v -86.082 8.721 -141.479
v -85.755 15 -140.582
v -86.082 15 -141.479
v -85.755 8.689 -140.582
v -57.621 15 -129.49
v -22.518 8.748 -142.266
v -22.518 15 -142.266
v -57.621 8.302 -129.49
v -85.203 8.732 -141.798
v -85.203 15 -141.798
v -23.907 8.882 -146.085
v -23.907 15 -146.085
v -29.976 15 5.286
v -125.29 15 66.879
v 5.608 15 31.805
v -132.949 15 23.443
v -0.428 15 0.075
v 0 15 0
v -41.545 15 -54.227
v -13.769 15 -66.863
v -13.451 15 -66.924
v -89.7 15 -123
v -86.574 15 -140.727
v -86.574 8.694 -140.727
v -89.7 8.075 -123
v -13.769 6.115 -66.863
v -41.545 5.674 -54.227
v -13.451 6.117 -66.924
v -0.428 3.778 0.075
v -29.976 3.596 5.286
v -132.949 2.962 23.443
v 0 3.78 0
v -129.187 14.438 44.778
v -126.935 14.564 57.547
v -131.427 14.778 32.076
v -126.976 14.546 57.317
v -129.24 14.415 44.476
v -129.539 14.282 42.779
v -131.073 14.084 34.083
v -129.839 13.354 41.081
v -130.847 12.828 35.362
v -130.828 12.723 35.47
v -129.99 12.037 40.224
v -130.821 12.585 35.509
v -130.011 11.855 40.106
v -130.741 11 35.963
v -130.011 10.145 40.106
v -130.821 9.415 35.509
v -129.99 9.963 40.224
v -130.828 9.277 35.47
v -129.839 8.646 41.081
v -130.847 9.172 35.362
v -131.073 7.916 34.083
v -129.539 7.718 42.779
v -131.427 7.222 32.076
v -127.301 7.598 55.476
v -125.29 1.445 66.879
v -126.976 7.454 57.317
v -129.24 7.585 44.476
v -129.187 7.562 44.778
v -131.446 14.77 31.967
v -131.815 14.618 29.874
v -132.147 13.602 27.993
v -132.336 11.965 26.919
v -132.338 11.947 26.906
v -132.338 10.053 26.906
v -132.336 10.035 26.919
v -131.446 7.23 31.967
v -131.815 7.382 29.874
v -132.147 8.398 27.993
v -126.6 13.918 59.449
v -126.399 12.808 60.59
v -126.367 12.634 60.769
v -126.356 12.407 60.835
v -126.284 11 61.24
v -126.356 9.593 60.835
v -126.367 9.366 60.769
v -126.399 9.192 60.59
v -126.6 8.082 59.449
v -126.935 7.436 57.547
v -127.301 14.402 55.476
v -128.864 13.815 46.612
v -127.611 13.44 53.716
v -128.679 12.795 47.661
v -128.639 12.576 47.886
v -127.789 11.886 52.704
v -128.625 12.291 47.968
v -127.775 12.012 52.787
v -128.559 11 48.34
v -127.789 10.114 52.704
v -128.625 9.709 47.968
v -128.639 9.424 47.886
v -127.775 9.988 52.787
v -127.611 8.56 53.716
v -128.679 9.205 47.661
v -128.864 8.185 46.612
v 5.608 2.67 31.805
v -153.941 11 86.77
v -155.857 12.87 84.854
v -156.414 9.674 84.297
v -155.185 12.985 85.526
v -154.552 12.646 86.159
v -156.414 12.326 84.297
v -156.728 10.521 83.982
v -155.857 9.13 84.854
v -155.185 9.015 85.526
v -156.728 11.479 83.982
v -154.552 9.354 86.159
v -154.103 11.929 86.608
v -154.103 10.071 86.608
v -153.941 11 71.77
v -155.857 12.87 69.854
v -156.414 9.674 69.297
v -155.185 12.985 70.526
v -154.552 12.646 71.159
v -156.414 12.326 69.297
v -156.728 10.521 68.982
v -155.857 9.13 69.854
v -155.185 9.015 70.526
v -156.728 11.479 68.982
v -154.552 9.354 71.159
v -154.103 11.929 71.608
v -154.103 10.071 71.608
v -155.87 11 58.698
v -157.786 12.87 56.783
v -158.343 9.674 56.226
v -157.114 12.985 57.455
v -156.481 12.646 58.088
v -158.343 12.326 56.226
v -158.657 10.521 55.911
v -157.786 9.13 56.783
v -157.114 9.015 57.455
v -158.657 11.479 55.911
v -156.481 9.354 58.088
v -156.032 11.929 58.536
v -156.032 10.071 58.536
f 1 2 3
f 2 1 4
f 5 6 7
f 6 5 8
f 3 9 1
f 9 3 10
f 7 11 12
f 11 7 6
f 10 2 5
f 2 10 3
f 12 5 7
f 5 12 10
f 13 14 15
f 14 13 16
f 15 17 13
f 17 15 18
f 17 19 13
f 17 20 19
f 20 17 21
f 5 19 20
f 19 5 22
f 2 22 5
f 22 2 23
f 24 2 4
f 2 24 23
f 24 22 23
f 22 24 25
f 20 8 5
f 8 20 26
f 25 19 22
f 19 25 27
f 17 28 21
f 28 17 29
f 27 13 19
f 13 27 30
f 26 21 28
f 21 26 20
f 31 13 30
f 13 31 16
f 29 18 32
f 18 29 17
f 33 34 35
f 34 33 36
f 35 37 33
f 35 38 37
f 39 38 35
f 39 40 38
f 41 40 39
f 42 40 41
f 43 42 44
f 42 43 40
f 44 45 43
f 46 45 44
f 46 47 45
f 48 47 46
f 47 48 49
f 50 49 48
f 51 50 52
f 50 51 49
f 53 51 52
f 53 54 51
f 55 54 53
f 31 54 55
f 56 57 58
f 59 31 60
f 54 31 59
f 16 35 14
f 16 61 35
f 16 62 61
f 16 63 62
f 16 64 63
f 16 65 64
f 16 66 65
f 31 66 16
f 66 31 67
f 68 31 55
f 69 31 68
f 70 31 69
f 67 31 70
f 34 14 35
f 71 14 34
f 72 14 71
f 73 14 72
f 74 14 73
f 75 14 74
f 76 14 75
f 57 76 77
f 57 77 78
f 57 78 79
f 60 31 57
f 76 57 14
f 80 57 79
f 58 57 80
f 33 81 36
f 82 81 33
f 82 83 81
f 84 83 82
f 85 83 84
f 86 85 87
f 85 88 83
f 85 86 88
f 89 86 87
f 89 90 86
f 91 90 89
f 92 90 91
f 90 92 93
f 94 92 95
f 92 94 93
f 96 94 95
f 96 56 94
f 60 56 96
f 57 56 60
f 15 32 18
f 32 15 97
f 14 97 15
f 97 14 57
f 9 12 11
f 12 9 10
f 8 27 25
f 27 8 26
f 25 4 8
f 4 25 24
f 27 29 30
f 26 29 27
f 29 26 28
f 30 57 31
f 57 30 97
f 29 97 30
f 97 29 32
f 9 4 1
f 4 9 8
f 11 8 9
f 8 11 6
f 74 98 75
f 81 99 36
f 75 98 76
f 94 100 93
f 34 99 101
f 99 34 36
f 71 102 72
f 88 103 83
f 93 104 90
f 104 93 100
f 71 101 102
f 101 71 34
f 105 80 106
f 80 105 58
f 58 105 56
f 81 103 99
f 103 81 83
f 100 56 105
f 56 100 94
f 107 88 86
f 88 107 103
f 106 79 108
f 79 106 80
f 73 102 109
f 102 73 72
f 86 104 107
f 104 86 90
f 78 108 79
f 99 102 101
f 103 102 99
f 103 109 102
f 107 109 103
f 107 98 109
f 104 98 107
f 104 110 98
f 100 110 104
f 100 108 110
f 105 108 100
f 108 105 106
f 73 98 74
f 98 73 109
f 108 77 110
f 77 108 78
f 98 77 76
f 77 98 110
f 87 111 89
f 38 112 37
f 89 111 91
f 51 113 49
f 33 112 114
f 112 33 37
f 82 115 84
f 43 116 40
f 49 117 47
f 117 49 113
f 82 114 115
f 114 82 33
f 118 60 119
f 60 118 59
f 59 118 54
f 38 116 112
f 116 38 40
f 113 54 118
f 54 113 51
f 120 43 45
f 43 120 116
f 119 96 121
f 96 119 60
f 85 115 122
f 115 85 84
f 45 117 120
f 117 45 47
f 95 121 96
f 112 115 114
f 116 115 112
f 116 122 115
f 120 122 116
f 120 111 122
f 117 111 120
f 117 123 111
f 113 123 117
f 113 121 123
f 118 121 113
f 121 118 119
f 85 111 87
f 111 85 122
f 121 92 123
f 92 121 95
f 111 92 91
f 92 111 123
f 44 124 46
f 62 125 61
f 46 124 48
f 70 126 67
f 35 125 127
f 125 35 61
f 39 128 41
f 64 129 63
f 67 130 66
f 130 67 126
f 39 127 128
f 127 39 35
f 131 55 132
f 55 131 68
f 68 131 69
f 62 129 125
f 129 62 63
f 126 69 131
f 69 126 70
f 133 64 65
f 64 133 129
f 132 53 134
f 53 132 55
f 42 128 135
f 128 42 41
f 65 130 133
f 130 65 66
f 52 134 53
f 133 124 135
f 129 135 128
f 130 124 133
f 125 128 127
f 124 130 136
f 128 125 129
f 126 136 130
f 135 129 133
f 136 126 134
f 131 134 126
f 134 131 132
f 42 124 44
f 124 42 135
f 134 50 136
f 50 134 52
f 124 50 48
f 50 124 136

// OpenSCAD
translate([-120, 11, 50])
rotate([0, -45, 0])
cylinder(50, 4, 2);

translate([-120, 11, 35])
rotate([0, -45, 0])
cylinder(50, 4, 2);

translate([-129, 11, 29])
rotate([0, -45, 0])
cylinder(40, 4, 2);

scale([3, 3, 3])
difference()
{
  union()
  {
    rotate([0, -80, 0])
    cube([15, 5, 45]);

    translate([-14.4, 0, -21])
    {
      translate([0.1, 0, 0.6])
      rotate([0, 11, 0])
      cube([10, 5, 30]);

      translate([-10, 0, -25])
      {
        translate([14.5, 0, -8])
        rotate([0, -70, 0])
        cube([7, 5, 20]);
        
        translate([-5.5, 0, 5])
        rotate([0, 80, 0])
        cube([6, 5, 10]);
        
        translate([-5.5, 0, 5])
        rotate([0, 35, 0])
        cube([10, 5, 30]);
      }
    }
  }

  color("red")
  {
    translate([-50, -2, 24.5])
    rotate([0, 15, 0])
    cube([100, 10, 100]);
    
    translate([-50, -2, -146])
    rotate([0, 4, 0])
    cube([100, 10, 100]);
  }
  
  translate([-50, -7, -50])
  rotate([2, 0, 0])
  cube([100, 10, 100]);
}
